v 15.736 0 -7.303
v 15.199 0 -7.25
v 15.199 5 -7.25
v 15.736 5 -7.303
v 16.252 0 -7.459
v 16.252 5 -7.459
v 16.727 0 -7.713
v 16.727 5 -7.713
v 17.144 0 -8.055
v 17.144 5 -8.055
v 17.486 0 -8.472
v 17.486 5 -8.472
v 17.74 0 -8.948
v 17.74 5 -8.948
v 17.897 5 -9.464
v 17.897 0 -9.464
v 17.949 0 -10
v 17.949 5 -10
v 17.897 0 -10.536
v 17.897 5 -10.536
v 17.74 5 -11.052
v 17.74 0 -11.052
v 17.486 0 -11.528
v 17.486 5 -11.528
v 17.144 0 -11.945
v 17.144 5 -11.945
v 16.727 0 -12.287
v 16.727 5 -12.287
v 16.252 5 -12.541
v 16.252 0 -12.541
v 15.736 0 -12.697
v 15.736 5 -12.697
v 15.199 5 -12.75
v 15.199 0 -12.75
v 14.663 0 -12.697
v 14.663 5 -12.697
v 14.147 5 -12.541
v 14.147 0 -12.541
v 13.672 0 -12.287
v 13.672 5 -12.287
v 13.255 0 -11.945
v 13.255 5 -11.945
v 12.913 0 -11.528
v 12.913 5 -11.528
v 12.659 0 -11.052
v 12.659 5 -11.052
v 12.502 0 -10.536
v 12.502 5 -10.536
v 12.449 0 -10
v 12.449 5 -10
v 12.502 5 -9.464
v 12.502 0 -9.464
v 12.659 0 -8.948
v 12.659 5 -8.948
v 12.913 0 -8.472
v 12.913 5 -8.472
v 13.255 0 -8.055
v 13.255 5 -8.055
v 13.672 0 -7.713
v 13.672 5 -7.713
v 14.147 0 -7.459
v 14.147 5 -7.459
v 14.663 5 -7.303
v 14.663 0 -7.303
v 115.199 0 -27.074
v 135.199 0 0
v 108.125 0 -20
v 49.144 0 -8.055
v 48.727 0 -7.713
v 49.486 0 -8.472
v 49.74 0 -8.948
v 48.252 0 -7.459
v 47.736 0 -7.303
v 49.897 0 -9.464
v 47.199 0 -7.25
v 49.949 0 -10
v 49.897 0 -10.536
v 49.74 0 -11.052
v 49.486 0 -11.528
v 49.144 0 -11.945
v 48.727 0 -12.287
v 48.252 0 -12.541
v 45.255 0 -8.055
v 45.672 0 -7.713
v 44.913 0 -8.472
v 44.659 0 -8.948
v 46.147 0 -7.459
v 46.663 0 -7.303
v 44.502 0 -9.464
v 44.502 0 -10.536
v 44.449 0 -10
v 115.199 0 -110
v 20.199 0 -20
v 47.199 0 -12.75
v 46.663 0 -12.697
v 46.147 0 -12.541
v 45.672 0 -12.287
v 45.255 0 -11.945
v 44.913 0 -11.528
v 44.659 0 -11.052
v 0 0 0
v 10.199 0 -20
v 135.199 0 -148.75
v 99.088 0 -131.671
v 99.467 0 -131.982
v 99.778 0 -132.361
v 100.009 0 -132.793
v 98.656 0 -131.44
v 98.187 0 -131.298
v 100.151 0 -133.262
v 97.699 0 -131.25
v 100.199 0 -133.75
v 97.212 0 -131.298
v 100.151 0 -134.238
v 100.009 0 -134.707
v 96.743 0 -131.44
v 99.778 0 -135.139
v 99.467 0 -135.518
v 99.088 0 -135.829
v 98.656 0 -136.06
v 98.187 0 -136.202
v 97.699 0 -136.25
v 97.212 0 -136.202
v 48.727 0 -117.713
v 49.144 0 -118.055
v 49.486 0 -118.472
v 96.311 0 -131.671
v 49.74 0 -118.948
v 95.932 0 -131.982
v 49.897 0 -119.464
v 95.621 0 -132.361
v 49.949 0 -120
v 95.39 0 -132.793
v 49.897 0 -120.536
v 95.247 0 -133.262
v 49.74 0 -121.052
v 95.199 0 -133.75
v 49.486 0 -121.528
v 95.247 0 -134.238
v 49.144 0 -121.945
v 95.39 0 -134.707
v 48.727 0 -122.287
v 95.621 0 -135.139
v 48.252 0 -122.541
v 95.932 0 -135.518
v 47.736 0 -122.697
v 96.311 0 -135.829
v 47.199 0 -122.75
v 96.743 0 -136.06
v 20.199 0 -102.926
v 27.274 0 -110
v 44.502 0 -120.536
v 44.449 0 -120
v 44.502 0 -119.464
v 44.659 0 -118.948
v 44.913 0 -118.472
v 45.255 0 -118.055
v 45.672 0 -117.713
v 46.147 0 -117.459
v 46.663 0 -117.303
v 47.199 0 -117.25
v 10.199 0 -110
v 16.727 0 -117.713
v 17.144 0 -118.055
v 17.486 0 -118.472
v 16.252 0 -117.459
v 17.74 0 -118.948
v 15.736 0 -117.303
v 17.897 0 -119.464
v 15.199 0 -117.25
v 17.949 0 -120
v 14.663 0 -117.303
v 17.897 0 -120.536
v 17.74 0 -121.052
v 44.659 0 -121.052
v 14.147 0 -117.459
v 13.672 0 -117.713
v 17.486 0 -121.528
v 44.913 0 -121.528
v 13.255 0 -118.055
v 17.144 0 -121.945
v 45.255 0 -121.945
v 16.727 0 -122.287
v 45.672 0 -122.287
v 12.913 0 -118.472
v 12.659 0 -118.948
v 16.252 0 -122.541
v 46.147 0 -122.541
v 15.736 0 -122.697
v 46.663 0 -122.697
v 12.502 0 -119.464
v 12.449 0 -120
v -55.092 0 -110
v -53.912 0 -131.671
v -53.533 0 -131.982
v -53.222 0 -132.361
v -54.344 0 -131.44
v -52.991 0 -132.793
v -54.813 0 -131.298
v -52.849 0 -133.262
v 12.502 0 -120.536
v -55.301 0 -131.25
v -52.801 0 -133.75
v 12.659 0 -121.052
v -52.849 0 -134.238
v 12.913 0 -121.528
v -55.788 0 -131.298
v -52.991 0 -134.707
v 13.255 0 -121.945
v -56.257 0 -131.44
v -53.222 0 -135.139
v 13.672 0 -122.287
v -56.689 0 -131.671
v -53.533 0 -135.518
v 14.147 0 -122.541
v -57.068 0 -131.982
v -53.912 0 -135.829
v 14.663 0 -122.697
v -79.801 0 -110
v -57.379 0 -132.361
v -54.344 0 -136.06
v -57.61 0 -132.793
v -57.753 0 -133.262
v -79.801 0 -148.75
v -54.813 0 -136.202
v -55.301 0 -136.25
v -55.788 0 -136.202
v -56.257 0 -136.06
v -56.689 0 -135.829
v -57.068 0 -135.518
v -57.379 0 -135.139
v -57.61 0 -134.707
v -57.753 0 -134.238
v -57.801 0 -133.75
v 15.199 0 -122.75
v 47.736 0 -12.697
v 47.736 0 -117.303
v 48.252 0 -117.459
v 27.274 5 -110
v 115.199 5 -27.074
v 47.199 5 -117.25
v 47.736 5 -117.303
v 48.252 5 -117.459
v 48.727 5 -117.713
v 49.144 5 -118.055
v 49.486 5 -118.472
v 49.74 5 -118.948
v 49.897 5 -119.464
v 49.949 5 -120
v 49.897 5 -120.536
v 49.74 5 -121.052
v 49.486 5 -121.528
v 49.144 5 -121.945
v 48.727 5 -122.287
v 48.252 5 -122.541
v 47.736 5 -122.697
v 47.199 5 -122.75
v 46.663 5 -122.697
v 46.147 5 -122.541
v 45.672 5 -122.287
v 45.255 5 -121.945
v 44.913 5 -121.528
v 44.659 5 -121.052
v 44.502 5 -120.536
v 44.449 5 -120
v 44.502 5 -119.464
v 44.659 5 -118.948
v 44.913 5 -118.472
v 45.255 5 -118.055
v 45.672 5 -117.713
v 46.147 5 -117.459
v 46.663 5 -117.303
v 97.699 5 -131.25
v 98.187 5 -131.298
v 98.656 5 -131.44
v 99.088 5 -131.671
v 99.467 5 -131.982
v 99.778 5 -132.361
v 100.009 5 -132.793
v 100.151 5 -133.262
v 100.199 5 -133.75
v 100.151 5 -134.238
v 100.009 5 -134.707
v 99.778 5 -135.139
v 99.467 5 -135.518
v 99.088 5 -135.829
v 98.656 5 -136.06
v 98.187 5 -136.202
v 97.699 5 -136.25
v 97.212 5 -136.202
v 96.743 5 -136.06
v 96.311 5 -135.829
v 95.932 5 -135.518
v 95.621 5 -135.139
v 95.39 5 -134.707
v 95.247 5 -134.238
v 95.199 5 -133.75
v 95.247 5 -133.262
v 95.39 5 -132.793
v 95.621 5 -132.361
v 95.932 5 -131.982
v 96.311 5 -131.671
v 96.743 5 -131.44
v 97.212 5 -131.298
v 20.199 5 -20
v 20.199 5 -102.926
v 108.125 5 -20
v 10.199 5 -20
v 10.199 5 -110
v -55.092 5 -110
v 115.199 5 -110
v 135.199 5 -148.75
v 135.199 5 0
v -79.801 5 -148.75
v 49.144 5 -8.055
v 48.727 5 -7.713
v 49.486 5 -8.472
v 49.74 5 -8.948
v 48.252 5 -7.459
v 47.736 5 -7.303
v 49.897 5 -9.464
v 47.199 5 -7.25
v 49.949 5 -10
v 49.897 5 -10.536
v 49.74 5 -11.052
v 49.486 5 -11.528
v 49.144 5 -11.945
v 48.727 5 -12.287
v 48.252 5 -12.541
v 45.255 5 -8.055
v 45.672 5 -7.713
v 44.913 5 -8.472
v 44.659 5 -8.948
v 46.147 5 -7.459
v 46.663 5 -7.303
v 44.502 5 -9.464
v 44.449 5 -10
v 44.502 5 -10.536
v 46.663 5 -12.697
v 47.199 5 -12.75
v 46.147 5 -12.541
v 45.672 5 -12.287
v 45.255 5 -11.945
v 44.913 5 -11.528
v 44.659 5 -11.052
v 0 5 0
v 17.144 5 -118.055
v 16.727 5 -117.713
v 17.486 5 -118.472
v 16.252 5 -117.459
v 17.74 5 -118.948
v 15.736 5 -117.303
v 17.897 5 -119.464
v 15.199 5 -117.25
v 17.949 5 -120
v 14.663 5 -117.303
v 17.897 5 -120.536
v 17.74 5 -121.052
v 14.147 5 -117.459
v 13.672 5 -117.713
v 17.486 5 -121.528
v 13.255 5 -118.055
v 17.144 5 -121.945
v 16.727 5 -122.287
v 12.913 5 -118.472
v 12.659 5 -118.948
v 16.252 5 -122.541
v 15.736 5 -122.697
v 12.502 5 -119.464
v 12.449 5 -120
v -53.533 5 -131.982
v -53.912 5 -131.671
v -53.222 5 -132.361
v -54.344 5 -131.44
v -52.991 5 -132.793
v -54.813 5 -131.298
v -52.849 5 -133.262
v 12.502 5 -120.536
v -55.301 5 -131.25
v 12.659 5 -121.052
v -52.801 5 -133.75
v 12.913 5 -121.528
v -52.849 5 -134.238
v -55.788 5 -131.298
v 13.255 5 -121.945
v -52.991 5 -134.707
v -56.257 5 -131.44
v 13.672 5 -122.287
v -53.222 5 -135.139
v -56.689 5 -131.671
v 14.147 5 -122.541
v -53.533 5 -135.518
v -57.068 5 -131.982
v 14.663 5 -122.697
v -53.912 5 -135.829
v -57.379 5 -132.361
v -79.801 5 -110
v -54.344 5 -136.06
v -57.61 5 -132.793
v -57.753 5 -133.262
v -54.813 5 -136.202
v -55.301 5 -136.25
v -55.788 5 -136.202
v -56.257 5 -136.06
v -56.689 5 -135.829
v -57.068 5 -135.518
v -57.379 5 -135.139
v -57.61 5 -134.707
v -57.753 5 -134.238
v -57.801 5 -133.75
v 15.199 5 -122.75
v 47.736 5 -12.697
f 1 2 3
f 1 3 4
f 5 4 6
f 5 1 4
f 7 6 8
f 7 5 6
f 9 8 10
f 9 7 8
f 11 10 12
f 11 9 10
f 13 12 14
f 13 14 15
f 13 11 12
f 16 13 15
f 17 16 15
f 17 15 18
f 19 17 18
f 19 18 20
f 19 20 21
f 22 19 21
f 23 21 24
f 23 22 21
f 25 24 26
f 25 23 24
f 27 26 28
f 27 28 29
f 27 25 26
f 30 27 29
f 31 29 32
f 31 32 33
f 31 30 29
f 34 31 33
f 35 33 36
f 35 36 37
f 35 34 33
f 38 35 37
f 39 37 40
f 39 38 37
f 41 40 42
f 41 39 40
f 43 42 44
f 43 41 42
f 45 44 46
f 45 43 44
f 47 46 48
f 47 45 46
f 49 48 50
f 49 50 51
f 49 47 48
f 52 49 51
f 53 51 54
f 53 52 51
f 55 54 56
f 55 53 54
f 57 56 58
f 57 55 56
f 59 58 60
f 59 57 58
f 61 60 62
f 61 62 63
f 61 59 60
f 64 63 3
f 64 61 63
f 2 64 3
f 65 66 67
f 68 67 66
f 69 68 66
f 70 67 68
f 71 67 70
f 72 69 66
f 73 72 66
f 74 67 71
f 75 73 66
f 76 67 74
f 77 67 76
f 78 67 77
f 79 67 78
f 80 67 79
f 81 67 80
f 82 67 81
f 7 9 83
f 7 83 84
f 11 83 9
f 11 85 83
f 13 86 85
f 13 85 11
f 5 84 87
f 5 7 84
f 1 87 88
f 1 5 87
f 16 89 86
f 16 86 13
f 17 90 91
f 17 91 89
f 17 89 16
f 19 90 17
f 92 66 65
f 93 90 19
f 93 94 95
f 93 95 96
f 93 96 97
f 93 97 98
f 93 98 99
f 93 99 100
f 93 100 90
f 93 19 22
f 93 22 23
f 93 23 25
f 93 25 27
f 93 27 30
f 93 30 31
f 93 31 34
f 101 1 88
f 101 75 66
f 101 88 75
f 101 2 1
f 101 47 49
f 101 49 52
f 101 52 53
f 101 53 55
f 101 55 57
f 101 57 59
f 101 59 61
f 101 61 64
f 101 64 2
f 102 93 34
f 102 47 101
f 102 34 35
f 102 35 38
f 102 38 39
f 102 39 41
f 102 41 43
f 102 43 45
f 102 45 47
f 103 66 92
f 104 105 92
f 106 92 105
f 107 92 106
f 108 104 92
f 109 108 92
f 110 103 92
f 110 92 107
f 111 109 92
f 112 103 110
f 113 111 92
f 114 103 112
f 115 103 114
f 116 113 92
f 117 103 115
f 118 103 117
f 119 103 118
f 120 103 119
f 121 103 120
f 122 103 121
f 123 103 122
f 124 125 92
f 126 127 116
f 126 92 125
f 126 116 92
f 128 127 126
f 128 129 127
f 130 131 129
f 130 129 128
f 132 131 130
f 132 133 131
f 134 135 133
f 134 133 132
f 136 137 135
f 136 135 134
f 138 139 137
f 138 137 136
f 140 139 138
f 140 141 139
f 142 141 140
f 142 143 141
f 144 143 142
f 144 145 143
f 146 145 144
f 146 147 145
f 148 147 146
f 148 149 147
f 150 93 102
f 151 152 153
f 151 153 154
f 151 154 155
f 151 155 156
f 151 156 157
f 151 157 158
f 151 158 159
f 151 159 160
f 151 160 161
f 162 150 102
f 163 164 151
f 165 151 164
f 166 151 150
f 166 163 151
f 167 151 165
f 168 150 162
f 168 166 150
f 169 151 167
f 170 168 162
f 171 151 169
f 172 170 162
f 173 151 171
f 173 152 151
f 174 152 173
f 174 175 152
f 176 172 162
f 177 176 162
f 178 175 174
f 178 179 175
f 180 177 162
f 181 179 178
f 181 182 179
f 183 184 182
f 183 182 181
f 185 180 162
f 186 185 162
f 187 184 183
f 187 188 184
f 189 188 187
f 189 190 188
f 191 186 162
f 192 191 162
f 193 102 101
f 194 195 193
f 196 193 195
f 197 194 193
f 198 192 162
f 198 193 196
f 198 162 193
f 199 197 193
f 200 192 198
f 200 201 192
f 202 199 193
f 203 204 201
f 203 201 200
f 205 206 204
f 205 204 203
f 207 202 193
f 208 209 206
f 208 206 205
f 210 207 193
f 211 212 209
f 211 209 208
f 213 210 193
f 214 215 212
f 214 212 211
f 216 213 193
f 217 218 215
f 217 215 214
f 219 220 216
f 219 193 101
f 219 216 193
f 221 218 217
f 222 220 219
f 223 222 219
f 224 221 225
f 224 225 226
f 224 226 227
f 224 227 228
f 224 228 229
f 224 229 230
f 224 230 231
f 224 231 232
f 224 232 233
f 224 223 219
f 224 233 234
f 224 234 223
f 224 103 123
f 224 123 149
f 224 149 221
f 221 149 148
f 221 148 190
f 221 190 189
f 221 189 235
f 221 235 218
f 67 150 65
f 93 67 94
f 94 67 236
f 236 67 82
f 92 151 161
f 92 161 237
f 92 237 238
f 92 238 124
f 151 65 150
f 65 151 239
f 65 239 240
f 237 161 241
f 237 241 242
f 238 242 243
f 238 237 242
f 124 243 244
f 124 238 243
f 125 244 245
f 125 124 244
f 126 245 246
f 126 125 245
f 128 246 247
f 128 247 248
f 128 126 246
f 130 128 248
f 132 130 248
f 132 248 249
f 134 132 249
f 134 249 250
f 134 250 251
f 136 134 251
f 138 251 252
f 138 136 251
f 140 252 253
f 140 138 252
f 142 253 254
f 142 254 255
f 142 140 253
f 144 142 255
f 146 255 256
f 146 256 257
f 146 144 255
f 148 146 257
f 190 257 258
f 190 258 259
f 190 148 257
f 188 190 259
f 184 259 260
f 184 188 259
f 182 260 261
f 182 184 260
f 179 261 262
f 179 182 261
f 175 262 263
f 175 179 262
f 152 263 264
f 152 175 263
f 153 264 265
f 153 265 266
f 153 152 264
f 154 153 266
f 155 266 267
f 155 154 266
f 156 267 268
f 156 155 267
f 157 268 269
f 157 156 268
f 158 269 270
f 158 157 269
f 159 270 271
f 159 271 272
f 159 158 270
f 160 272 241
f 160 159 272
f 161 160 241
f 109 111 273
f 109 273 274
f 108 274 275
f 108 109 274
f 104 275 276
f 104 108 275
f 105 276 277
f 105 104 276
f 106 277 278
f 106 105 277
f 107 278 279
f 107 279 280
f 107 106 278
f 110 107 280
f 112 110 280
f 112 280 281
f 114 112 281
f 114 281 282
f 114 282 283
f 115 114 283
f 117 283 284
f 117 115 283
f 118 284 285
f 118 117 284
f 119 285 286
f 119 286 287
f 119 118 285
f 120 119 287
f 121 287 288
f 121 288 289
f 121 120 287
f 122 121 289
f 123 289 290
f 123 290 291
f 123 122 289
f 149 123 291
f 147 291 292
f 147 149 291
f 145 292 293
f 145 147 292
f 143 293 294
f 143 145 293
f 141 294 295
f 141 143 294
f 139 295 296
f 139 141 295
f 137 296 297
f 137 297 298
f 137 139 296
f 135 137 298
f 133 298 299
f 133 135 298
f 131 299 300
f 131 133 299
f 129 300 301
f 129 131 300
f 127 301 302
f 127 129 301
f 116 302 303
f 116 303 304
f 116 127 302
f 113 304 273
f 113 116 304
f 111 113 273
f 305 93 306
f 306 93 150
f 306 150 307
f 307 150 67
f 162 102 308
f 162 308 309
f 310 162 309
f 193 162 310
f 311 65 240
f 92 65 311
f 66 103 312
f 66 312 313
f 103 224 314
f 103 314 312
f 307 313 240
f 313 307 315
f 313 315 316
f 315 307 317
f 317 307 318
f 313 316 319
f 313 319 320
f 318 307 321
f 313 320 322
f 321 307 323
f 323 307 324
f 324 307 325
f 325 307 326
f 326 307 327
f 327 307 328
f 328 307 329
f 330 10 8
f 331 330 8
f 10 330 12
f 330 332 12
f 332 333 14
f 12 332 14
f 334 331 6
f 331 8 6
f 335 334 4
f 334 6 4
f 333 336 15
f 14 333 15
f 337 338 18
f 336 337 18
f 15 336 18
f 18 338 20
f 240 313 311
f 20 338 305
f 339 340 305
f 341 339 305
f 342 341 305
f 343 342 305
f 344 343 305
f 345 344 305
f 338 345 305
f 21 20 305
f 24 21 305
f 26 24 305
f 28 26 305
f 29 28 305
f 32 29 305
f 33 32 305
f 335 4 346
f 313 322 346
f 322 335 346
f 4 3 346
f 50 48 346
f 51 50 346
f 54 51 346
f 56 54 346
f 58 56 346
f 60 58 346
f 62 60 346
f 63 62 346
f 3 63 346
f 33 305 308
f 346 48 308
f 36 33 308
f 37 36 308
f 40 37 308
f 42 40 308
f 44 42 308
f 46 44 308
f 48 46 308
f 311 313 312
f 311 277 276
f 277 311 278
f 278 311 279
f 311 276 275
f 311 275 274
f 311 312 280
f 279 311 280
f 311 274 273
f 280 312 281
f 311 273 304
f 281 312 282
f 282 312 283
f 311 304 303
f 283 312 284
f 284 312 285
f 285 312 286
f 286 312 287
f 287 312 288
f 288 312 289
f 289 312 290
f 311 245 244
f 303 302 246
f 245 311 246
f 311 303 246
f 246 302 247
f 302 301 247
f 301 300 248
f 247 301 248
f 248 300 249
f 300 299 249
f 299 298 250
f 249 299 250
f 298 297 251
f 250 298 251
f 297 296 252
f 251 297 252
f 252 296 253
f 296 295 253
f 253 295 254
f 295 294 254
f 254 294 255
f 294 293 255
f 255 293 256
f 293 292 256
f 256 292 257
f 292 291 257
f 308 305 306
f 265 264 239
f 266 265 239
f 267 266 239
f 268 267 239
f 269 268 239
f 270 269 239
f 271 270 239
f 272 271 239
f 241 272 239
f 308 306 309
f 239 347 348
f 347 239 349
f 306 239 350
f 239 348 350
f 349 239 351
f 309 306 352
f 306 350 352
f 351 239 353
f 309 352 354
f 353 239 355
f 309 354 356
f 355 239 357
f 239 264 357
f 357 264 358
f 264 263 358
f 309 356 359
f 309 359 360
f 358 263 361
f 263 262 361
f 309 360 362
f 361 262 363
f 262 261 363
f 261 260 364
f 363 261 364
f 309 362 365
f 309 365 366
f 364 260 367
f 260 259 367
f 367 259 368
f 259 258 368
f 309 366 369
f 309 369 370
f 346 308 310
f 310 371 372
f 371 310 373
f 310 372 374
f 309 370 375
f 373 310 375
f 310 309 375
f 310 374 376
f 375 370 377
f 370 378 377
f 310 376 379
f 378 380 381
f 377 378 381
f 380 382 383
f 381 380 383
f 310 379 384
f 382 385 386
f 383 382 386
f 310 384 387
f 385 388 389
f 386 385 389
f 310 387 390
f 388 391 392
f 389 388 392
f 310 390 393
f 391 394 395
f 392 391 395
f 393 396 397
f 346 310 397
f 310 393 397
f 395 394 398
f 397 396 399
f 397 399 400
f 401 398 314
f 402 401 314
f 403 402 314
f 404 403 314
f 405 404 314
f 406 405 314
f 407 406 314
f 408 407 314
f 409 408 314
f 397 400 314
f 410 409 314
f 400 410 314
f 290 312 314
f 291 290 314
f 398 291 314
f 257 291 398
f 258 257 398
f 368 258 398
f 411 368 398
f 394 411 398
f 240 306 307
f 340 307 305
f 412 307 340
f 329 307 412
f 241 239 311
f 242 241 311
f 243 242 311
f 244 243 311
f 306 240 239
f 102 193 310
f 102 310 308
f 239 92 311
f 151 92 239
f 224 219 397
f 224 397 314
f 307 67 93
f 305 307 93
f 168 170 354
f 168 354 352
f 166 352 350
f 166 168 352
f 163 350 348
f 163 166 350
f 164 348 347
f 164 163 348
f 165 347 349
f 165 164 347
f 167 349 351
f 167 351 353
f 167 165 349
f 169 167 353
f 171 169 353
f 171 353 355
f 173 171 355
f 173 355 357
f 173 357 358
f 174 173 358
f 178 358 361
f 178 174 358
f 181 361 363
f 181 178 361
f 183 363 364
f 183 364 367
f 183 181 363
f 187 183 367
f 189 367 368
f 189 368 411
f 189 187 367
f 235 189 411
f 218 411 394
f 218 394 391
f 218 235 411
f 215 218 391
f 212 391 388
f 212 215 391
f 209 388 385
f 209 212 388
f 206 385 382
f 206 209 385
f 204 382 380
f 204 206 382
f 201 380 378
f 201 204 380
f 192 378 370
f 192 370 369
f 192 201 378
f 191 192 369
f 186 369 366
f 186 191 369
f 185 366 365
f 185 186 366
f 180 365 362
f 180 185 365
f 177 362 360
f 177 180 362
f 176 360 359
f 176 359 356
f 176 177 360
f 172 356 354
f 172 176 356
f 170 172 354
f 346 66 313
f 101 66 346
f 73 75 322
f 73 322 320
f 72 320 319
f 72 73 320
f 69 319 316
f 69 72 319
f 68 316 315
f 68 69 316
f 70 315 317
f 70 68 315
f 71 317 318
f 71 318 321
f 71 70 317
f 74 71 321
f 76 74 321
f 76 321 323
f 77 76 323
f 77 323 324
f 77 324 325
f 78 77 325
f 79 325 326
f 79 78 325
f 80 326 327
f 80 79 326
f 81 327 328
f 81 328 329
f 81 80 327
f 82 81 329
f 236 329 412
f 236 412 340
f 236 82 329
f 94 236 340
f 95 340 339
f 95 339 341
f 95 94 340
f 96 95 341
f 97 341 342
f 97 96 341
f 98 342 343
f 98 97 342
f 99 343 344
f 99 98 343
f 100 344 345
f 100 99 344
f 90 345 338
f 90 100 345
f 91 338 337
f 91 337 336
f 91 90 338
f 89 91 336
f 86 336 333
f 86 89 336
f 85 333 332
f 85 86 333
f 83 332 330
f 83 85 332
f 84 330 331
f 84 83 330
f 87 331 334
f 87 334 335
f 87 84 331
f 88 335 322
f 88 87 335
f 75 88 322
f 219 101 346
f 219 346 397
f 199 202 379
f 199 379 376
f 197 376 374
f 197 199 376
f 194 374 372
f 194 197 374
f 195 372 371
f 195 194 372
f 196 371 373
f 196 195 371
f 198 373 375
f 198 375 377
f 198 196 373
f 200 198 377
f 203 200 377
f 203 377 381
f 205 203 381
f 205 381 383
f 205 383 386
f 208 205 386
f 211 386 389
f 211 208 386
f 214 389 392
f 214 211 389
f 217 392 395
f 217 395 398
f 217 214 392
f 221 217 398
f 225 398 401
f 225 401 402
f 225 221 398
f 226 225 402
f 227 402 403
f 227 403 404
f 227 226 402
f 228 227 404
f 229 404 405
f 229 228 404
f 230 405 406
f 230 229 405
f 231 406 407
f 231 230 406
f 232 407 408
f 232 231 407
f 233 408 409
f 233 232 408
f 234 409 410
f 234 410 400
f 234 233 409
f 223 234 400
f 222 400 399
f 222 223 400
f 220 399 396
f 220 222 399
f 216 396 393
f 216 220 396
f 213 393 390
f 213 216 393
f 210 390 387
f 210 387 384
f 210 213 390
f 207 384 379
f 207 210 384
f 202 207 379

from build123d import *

# Parameters (mm, degrees)
SKETCH1_R           = 2.75
SKETCH1_R_2         = 2.5
BOSS_EXTRUDE2_DEPTH = 5


with BuildPart() as part:
    # Sketch1 → Boss-Extrude2 (new body)
    with BuildSketch(Plane(origin=(0, 0, 0), x_dir=(1, 0, 0), z_dir=(0, 1, 0))):
        Polygon((135.199443114, 0), (0, 0), (-79.800556886, 110), (-79.800556886, 148.75), (135.199443114, 148.75), align=None)
        with Locations(Location((15.199443114, 10, 0), (0, 0, 270))):
            Circle(SKETCH1_R, mode=Mode.SUBTRACT)
        with Locations(Location((47.199443114, 10, 0), (0, 0, 270))):
            Circle(SKETCH1_R, mode=Mode.SUBTRACT)
        with Locations(Location((15.199443114, 120, 0), (0, 0, 270))):
            Circle(SKETCH1_R, mode=Mode.SUBTRACT)
        with Locations(Location((47.199443114, 120, 0), (0, 0, 270))):
            Circle(SKETCH1_R, mode=Mode.SUBTRACT)
        with Locations(Location((-55.300556886, 133.75, 0), (0, 0, 270))):
            Circle(SKETCH1_R_2, mode=Mode.SUBTRACT)
        with Locations(Location((97.699443114, 133.75, 0), (0, 0, 270))):
            Circle(SKETCH1_R_2, mode=Mode.SUBTRACT)
        Polygon((20.199443114, 102.925904836), (108.125347951, 20), (20.199443114, 20), align=None, mode=Mode.SUBTRACT)
        Polygon((27.273538278, 110), (115.199443114, 27.074095164), (115.199443114, 110), align=None, mode=Mode.SUBTRACT)
        Polygon((-55.091921611, 110), (10.199443114, 20), (10.199443114, 110), align=None, mode=Mode.SUBTRACT)
    extrude(amount=BOSS_EXTRUDE2_DEPTH)


solid = part.part
